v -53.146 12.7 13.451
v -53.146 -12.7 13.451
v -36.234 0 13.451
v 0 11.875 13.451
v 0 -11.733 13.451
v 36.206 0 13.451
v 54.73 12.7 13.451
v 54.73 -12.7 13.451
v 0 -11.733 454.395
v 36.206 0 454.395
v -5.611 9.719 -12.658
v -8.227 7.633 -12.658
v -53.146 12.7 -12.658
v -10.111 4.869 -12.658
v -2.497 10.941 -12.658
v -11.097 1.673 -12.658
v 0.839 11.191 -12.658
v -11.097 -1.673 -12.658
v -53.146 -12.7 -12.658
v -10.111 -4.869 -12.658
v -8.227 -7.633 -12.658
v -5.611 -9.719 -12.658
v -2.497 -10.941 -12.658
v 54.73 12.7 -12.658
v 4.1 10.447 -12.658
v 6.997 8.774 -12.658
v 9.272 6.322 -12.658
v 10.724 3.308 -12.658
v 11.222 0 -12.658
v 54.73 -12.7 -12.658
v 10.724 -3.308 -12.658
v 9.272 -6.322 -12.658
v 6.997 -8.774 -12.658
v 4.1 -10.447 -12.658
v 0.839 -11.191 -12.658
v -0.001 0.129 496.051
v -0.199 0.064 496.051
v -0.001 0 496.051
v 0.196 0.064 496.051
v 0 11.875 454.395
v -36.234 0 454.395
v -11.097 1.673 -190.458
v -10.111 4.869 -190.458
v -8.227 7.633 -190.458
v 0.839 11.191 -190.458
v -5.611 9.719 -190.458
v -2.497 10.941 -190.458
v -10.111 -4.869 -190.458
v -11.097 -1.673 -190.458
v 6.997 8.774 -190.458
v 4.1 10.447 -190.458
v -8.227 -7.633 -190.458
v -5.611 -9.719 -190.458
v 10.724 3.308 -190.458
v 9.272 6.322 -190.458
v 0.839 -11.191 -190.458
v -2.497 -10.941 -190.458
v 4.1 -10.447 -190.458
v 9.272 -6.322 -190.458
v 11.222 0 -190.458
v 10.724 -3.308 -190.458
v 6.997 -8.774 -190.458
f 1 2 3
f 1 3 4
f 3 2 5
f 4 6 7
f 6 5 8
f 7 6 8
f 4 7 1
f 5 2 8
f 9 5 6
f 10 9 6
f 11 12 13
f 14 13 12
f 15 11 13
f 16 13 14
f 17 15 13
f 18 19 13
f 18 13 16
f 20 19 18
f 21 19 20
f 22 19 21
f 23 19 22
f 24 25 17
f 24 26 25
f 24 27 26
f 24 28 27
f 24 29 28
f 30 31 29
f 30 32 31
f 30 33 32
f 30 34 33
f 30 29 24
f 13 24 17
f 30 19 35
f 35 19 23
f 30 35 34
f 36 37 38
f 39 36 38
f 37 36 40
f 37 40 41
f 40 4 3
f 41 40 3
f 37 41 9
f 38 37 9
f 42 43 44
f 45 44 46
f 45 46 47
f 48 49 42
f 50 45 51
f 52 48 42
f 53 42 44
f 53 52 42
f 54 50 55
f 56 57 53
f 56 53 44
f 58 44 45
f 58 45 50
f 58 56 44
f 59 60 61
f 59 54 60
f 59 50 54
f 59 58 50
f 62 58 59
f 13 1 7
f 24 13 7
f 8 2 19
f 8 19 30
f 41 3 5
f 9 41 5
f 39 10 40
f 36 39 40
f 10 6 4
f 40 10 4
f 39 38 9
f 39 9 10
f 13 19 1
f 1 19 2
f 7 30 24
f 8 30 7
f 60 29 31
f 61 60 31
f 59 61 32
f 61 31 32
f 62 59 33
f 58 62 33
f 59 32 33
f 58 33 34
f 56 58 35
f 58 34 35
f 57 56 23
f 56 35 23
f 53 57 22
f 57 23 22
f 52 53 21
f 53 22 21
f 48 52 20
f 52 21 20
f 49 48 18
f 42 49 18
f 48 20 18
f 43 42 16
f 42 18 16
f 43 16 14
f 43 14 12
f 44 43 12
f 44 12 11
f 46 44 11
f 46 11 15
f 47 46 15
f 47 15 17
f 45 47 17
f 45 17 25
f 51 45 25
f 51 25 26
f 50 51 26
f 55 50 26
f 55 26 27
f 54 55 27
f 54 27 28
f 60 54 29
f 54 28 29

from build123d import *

# Parameters (mm, degrees)
F0_W     = 107.8754812479
F0_H     = 26.1090872809
F1_DEPTH = 12.7
F2_DEPTH = 12.7
F3_R     = 11.2223896829
F4_DEPTH = 177.8
F6_DEPTH = 482.6
F7_SIZE2 = 11.1616915599
F7_SIZE  = 41.656


with BuildPart() as f1:
    # F0 (on Front) → F1 (new body)
    with BuildSketch(Plane.XZ):
        with Locations((0.7920116186, 0.3961385228)):
            Rectangle(F0_W, F0_H)
    extrude(amount=F1_DEPTH)

    # F2 (add): a face of the model
    f2_faces = [f1.faces().sort_by_distance(p)[0] for p in [
        (0.7920116186, 0, 0.3961385228),
    ]]
    extrude(f2_faces, amount=F2_DEPTH)

    # F3 (on face) → F4 (join)
    with BuildSketch(Plane(origin=(0, 0, -12.6584051177), x_dir=(1, 0, 0), z_dir=(0, 0, -1))):
        Circle(F3_R)
    extrude(amount=F4_DEPTH)

    # F5 (on face) → F6 (join)
    with BuildSketch(Plane.XY.offset(13.4506821632)):
        Polygon((36.2057685852, 0), (0, 11.8748378009), (-36.2340435386, 0), (0, -11.7327794433), align=None)
    extrude(amount=F6_DEPTH)

    # F7
    f7_edges = [f1.edges().sort_by_distance(p)[0] for p in [
        (-18.117022, -5.86639, 496.050682),
        (18.102884, -5.86639, 496.050682),
        (18.102884, 5.937419, 496.050682),
        (-18.117022, 5.937419, 496.050682),
    ]]
    chamfer(f7_edges, length=F7_SIZE, length2=F7_SIZE2)


solid = f1.part
